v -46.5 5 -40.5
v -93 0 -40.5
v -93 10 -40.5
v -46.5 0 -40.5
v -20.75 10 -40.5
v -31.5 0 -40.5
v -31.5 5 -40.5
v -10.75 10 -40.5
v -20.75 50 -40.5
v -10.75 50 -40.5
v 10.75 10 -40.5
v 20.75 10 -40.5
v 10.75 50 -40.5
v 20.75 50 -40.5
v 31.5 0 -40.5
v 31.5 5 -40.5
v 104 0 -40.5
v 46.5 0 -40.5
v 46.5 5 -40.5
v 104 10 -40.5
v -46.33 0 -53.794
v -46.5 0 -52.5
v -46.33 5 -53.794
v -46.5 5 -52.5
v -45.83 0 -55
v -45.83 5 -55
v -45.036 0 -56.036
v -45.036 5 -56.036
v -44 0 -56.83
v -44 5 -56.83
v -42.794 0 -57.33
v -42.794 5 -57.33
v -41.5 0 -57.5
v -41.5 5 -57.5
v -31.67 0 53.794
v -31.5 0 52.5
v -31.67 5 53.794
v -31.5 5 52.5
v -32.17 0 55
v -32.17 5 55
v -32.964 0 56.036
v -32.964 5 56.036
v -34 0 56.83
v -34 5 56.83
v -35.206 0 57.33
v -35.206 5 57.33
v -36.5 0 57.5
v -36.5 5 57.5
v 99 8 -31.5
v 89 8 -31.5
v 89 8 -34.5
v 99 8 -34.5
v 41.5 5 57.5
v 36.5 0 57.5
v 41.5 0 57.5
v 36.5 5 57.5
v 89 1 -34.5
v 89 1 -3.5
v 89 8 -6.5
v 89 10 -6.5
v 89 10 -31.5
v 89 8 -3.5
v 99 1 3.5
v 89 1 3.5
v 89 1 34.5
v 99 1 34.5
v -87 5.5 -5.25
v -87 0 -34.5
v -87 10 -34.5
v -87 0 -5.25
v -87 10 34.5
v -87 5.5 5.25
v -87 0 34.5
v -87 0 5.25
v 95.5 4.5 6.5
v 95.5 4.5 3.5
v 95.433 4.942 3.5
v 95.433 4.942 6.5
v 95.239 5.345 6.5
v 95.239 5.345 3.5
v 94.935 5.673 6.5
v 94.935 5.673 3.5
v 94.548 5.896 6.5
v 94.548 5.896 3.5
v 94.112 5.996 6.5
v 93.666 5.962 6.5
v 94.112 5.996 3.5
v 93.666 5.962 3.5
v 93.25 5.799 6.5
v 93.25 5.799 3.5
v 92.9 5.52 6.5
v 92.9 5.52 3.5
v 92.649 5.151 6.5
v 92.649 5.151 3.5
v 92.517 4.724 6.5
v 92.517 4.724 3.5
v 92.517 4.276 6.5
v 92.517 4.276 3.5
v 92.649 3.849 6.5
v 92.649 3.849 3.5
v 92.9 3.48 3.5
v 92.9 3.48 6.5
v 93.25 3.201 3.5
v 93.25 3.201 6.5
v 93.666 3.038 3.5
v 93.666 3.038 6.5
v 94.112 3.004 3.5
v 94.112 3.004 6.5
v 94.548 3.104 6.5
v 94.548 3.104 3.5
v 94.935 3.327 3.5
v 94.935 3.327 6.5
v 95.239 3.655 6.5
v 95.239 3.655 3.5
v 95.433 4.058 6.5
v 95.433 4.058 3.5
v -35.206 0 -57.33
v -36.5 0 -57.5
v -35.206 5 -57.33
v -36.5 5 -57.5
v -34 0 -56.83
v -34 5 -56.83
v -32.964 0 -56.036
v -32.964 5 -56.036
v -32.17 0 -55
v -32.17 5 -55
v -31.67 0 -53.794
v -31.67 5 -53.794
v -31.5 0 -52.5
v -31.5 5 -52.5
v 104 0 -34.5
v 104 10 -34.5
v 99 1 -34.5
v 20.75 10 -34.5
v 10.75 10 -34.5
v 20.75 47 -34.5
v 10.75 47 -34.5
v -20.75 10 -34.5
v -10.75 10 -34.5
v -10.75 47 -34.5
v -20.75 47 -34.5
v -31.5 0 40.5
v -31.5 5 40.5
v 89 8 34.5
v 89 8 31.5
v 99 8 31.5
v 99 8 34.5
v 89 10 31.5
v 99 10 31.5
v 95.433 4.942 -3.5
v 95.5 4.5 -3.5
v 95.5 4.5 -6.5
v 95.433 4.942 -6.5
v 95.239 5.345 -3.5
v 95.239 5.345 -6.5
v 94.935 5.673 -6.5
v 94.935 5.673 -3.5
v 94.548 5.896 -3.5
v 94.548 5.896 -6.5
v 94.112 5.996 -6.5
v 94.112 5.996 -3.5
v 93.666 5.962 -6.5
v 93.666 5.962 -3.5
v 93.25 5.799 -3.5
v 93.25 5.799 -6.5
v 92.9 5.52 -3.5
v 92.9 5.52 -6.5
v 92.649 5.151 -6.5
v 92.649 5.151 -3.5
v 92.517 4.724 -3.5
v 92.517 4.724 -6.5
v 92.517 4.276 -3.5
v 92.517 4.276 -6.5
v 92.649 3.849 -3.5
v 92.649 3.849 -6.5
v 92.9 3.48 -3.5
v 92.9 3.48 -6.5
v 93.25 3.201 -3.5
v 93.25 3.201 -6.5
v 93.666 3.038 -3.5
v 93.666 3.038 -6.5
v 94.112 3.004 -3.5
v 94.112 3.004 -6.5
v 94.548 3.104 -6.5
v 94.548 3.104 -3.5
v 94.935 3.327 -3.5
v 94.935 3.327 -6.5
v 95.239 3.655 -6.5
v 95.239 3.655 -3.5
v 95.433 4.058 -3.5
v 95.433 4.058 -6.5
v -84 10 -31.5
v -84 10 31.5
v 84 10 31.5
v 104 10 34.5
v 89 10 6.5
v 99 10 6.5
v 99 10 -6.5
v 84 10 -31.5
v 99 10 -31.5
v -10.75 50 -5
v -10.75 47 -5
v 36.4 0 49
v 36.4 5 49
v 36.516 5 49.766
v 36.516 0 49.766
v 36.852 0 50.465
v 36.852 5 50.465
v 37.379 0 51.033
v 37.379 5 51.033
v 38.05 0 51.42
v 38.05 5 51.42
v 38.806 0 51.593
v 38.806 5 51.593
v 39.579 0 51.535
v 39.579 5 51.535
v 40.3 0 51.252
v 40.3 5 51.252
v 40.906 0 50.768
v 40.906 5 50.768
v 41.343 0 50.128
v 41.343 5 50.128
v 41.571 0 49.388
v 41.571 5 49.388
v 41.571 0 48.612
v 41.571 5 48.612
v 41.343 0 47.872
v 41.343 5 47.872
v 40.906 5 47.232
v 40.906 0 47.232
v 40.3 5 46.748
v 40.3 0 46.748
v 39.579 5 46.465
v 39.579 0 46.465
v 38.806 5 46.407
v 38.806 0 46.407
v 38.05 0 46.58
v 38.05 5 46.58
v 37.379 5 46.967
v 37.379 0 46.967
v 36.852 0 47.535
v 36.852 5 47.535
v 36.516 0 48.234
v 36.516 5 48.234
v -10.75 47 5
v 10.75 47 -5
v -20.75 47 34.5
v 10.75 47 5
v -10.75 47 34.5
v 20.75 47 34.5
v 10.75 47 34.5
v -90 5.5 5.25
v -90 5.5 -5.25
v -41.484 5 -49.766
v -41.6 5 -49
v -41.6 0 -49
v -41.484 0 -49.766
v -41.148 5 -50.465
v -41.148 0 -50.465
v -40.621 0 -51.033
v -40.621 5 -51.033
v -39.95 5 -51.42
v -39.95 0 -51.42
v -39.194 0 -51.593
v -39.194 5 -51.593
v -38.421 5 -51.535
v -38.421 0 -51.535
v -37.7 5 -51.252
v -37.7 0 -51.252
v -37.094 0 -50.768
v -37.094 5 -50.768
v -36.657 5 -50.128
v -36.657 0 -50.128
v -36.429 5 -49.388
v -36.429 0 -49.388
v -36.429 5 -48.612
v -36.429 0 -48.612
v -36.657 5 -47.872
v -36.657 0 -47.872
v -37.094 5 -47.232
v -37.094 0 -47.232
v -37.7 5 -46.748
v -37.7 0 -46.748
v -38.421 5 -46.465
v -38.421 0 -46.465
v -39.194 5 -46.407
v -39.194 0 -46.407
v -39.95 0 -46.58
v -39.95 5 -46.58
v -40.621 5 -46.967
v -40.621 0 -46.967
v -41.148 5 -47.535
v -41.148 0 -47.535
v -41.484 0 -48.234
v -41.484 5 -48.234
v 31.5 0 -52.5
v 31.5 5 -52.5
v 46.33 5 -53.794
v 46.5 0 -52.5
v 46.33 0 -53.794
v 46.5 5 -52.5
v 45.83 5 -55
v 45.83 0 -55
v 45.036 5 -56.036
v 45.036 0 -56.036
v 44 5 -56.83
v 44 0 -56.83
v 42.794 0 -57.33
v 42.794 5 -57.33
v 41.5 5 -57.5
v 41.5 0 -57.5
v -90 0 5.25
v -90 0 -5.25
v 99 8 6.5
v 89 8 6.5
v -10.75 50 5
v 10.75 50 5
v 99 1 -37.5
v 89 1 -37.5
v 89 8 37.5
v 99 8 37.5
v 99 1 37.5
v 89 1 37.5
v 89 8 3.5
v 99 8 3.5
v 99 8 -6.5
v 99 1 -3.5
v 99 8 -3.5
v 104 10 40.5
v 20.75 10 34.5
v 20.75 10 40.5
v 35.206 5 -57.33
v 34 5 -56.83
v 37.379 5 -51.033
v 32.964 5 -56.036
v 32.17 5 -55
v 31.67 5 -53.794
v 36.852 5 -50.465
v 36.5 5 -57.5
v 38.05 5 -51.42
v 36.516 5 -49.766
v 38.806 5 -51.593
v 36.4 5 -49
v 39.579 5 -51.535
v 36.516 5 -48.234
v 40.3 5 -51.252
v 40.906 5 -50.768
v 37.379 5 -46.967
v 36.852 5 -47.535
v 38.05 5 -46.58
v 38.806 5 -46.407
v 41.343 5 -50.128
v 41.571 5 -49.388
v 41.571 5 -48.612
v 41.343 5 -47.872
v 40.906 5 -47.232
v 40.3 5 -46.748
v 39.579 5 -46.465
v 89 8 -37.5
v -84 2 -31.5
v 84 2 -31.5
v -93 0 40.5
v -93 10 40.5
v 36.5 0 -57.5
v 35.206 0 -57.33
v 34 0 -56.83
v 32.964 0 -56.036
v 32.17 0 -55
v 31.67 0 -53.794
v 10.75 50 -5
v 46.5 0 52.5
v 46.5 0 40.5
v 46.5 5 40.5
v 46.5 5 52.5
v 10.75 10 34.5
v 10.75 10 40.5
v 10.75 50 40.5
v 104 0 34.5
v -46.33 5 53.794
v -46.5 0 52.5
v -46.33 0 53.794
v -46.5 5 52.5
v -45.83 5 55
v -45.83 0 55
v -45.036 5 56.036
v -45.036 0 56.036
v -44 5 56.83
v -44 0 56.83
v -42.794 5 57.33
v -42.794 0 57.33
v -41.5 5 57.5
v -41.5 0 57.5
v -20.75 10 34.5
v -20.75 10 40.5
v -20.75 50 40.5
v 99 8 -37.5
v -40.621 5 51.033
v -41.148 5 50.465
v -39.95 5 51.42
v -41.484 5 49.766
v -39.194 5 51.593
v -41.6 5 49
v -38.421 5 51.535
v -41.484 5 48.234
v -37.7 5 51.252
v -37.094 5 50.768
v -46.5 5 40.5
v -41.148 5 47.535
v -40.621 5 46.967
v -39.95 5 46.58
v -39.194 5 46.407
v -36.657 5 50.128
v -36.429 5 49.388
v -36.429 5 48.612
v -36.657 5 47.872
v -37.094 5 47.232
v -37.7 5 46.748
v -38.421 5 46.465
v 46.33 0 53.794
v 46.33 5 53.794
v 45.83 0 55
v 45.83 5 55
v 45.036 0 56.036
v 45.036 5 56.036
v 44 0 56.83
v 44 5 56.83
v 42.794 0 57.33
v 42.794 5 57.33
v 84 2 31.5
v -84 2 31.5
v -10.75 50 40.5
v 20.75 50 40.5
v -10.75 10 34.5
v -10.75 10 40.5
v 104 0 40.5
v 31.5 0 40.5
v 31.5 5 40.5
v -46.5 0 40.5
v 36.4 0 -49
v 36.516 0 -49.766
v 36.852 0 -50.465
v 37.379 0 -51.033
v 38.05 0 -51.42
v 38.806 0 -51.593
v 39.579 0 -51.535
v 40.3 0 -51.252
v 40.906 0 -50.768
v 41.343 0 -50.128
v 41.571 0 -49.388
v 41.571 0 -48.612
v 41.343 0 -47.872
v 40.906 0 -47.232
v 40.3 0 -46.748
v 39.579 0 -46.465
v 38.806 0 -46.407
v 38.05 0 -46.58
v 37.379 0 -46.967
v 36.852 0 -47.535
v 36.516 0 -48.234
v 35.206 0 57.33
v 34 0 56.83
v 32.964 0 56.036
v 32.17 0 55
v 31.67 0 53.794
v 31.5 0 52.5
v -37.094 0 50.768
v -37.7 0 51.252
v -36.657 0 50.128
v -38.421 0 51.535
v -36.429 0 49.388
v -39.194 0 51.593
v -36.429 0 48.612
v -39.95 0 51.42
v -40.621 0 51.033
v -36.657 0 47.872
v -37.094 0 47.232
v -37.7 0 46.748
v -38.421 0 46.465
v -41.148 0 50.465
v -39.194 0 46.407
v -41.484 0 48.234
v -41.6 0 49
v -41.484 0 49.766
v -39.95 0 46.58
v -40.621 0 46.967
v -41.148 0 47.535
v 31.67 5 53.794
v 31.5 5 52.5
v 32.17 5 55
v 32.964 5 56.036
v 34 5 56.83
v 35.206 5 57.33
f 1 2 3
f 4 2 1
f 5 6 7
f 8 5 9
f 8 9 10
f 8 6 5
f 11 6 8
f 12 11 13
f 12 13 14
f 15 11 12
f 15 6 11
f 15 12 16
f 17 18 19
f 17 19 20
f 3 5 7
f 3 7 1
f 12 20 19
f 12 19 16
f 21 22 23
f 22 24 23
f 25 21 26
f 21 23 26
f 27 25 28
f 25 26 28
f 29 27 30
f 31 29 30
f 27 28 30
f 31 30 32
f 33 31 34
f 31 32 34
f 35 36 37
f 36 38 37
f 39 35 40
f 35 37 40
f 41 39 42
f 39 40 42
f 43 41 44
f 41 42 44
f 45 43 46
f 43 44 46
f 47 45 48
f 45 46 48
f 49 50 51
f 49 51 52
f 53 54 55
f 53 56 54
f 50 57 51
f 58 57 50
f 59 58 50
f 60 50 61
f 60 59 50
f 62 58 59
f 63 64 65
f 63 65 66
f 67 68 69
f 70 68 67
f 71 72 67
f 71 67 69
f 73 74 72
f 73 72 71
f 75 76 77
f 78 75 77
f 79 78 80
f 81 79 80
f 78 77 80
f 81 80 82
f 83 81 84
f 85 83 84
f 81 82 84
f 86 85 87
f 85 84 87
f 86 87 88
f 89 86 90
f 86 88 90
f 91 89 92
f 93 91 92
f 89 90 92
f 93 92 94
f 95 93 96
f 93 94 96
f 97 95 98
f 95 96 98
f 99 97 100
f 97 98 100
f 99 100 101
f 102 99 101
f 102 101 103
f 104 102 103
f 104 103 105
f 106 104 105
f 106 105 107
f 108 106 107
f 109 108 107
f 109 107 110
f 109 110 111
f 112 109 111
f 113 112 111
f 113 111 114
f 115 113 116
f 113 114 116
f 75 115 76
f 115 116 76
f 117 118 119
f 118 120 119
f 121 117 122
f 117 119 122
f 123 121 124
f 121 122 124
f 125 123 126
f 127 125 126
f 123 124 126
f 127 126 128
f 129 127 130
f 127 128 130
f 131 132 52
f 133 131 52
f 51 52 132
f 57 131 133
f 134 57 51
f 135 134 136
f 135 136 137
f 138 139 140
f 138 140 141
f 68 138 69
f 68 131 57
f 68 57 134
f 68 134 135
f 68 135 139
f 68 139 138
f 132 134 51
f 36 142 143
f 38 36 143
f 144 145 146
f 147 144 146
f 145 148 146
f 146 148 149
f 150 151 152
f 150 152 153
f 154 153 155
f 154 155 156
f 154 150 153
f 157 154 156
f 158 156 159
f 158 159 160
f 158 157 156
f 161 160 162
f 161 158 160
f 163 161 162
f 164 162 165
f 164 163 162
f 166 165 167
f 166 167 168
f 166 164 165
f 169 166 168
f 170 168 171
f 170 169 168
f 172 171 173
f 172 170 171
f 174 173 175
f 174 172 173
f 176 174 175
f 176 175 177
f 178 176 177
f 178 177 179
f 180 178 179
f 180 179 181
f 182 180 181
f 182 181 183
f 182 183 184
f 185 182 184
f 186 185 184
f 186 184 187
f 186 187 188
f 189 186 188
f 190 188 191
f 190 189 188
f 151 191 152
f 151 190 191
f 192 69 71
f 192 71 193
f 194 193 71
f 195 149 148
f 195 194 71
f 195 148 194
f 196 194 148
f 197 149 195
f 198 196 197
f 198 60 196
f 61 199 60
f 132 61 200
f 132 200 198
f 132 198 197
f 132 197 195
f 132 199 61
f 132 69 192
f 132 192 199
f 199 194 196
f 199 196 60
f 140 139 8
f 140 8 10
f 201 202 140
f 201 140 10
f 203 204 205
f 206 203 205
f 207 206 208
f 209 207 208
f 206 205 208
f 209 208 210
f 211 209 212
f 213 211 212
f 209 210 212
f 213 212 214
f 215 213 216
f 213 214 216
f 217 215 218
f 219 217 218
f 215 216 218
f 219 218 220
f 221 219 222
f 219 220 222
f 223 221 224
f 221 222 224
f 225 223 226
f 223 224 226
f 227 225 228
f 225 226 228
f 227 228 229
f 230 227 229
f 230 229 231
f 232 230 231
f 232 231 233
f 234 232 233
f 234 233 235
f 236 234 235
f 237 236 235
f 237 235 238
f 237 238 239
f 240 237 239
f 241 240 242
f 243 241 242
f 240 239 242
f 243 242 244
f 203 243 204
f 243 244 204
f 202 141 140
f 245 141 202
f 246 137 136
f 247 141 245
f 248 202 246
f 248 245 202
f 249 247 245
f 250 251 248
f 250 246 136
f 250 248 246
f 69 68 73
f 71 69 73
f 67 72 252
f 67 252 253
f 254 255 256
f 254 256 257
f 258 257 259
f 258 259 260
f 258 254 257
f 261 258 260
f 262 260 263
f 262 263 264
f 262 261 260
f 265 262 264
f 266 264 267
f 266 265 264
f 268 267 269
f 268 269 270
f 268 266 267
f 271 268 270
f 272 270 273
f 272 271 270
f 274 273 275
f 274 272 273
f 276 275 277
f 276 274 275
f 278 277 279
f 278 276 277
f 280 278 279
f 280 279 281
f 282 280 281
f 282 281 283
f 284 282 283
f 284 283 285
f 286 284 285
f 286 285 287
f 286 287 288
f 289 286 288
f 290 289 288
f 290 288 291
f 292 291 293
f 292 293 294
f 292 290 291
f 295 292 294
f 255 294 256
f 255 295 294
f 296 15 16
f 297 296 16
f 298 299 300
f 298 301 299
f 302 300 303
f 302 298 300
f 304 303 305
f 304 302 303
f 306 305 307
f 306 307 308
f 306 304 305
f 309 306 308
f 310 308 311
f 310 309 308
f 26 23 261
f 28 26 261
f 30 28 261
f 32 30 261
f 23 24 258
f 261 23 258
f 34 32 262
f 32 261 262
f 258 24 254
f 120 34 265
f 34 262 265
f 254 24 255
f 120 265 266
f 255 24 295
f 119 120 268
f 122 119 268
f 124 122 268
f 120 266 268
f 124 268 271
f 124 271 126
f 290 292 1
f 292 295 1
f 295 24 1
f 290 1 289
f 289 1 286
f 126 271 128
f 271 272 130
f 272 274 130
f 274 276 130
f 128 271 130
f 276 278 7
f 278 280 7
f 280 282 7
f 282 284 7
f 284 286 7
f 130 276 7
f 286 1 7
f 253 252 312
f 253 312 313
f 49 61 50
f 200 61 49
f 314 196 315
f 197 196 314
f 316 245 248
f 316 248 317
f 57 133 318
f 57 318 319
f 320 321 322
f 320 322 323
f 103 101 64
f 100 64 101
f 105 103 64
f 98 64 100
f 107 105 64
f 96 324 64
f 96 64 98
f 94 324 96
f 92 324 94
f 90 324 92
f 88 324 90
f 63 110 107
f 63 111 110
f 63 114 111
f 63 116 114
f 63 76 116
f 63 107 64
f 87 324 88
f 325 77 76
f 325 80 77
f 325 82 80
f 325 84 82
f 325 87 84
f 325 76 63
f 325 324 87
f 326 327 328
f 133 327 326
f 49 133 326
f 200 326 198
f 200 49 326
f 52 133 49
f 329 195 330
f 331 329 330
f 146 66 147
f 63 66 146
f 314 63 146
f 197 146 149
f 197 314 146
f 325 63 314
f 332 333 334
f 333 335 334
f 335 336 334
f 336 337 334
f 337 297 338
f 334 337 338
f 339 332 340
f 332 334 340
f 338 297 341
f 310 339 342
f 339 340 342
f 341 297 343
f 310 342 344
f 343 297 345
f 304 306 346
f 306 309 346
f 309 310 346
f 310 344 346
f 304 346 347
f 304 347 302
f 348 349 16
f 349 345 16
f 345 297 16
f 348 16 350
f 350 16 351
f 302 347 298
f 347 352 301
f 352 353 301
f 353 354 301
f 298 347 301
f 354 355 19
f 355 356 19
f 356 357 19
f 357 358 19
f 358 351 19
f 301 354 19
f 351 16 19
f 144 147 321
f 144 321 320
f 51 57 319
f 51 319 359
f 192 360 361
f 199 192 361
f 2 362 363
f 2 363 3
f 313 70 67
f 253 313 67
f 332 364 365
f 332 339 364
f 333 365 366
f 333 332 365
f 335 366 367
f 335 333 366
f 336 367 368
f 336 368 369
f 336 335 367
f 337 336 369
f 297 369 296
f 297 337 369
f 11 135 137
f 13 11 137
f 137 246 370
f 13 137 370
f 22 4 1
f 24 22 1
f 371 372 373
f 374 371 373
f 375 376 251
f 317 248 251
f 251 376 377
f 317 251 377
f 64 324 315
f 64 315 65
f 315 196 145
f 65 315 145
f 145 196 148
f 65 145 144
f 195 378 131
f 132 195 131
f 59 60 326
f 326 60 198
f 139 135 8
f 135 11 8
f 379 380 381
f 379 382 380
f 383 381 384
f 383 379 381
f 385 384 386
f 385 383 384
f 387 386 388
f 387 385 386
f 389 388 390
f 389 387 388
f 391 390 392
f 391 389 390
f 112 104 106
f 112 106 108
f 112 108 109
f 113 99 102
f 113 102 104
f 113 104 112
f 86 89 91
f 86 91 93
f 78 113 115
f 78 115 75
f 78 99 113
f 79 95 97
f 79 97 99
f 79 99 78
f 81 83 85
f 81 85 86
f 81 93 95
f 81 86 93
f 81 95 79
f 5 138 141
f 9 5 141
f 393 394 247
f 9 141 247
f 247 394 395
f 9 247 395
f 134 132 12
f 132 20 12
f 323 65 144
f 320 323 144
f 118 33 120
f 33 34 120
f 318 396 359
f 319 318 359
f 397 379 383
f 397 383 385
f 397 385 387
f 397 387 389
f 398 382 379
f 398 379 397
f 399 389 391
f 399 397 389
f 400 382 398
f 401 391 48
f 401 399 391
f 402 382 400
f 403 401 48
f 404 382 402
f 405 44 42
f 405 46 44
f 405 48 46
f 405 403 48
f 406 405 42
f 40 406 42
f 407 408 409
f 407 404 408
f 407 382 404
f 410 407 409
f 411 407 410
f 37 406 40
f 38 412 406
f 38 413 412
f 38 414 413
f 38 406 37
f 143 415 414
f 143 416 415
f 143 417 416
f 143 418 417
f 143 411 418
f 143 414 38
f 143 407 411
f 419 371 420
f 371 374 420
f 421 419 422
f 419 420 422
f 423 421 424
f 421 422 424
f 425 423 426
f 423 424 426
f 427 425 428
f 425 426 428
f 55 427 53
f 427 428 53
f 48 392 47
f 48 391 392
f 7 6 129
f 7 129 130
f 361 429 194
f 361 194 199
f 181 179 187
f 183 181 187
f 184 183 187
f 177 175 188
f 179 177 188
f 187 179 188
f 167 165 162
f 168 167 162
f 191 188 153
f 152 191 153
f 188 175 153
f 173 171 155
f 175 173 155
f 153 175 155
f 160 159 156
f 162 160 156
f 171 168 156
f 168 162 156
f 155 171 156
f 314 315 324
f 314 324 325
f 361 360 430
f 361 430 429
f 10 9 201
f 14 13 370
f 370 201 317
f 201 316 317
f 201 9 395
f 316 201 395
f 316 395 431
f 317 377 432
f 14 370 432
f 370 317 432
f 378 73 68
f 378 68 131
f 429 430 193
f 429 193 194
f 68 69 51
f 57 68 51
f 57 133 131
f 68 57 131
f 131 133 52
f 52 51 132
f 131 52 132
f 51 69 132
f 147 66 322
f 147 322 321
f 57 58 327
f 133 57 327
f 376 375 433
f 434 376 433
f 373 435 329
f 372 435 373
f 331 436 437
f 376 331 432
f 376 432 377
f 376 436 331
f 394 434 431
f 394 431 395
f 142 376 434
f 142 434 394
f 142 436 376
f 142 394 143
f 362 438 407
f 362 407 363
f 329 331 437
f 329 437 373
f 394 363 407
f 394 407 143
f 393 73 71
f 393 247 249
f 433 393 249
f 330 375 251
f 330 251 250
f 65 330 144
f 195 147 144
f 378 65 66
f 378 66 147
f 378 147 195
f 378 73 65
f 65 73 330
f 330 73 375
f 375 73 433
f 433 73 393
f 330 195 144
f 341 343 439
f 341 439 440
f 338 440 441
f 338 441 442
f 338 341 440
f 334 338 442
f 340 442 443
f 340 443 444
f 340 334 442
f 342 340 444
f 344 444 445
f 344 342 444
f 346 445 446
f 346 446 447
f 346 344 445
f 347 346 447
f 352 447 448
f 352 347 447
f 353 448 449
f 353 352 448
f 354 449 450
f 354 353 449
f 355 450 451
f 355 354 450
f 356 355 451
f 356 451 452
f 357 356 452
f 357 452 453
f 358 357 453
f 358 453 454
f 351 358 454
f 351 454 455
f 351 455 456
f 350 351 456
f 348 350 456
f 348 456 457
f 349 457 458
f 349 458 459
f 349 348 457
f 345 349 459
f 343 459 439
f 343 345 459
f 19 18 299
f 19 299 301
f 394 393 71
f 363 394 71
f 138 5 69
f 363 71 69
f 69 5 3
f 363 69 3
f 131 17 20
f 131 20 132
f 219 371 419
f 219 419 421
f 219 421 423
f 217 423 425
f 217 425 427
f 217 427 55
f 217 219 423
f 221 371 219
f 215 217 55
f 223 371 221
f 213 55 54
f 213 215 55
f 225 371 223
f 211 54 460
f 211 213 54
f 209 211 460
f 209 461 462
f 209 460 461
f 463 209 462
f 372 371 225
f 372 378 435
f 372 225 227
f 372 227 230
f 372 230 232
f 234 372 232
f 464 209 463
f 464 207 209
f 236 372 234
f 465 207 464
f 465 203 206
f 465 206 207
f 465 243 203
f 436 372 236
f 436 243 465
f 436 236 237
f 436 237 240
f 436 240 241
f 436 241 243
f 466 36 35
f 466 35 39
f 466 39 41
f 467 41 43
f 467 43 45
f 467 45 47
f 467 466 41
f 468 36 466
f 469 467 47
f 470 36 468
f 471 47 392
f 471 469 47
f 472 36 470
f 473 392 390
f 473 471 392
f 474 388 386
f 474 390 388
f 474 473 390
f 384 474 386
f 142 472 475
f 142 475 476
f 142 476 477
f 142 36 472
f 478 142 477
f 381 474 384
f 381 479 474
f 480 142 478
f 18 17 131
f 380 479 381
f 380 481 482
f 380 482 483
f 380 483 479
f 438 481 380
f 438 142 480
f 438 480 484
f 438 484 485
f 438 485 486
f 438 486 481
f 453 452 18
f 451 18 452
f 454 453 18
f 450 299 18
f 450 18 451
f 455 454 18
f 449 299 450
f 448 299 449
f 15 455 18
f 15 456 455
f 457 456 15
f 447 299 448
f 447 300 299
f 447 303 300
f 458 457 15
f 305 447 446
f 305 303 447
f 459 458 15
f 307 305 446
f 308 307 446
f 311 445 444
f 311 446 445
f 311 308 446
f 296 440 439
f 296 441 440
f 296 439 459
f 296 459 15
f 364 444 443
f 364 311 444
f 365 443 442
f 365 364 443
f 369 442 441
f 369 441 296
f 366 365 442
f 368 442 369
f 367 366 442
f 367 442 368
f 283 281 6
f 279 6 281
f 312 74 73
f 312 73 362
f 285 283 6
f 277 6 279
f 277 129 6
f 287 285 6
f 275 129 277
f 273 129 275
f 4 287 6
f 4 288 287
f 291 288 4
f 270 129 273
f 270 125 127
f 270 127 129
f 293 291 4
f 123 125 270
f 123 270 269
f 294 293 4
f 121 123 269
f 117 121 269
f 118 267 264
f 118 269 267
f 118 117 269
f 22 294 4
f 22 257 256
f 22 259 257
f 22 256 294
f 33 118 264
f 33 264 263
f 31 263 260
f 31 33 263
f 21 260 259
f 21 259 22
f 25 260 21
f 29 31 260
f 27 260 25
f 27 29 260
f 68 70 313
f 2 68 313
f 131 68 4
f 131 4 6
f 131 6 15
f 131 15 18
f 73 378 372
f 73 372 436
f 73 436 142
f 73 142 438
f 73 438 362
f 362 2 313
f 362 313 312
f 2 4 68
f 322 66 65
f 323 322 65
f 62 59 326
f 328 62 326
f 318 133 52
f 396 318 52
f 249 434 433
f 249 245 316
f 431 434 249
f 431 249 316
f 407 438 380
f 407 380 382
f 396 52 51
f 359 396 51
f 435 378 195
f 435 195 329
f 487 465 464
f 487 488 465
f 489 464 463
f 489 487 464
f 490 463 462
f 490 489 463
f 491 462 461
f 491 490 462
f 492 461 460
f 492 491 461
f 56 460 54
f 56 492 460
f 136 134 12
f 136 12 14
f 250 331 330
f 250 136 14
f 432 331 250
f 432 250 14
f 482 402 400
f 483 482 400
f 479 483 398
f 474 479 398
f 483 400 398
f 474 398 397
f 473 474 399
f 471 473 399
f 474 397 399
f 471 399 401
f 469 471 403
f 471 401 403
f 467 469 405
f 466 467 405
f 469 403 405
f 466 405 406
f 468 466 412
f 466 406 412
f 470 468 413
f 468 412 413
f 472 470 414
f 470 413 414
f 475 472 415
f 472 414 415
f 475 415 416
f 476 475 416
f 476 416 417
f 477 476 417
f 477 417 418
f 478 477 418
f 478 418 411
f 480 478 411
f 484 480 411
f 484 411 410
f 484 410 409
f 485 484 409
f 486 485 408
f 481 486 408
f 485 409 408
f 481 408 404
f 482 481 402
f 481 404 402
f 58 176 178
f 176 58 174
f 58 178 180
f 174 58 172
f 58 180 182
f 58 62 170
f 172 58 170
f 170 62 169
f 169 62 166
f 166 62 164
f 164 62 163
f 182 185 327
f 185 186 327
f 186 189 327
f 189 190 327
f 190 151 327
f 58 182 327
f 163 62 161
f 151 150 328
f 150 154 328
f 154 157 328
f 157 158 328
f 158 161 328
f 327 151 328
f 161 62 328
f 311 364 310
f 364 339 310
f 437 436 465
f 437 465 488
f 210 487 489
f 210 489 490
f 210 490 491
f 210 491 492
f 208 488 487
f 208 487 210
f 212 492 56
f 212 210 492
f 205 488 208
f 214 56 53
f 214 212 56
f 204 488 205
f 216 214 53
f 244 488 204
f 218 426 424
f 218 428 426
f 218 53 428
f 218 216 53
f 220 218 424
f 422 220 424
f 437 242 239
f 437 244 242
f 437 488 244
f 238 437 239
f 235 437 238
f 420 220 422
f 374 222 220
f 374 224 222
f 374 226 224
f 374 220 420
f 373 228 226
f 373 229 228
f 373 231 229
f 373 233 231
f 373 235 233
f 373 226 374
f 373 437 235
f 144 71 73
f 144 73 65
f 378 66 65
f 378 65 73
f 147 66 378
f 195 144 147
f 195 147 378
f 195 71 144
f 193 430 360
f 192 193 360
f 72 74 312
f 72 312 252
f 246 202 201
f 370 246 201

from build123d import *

# Parameters (mm, degrees)
SKETCH1_W                      = 168
SKETCH1_H                      = 63
BOSS_EXTRUDE1_DEPTH            = 10
SKETCH2_W                      = 168
SKETCH2_H                      = 63
BOSS_EXTRUDE2_DEPTH            = 2
SKETCH3_W                      = 10
SKETCH3_H                      = 25
CUT_EXTRUDE1_DEPTH             = 111.028405423
SKETCH4_W                      = 10
SKETCH4_H                      = 8
CUT_EXTRUDE2_DEPTH             = 3
CUT_EXTRUDE2_DIRECTION_2_REACH = 114.236
SKETCH6_W                      = 10
SKETCH6_H                      = 1
BOSS_EXTRUDE4_DEPTH            = 31
SKETCH7_R                      = 1.5
BOSS_EXTRUDE5_DEPTH            = 3
BOSS_EXTRUDE6_DEPTH            = 10
SKETCH16_W                     = 10.5
SKETCH16_H                     = 5.5
CUT_EXTRUDE5_DEPTH             = 3
SKETCH15_W                     = 10
SKETCH15_H                     = 7
CUT_EXTRUDE6_DEPTH             = 3
SKETCH17_W                     = 15
SKETCH17_H                     = 5
BOSS_EXTRUDE7_DEPTH            = 17
SKETCH18_R                     = 2.6
CUT_EXTRUDE7_DEPTH             = 5
FILLET1_R                      = 5
FILLET1_OF_MIRROR8_R           = 5
SKETCH19_W                     = 10
SKETCH19_H                     = 6
BOSS_EXTRUDE8_DEPTH            = 40
BOSS_EXTRUDE9_REACH            = 149.58
SKETCH20_W                     = 10
SKETCH20_H                     = 3
BOSS_EXTRUDE10_REACH           = 139.745
SKETCH21_W                     = 10
SKETCH21_H                     = 3


with BuildPart() as part:
    # Sketch1 → Boss-Extrude1 (new body)
    with BuildSketch(Plane(origin=(0, 0, 0), x_dir=(1, 0, 0), z_dir=(0, 1, 0))):
        Polygon((0, 34.5), (-87, 34.5), (-87, -34.5), (84, -34.5), (104, -34.5), (104, 34.5), (84, 34.5), align=None)
        Rectangle(SKETCH1_W, SKETCH1_H, mode=Mode.SUBTRACT)
    extrude(amount=BOSS_EXTRUDE1_DEPTH)

    # Sketch2 → Boss-Extrude2 (add)
    with BuildSketch(Plane(origin=(0, 0, 0), x_dir=(1, 0, 0), z_dir=(0, 1, 0))):
        Rectangle(SKETCH2_W, SKETCH2_H)
    extrude(amount=BOSS_EXTRUDE2_DEPTH)

    # Sketch3 → Cut-Extrude1 (cut, through all)
    with BuildSketch(Plane(origin=(0, 10, 0), x_dir=(1, 0, 0), z_dir=(0, 1, 0))):
        with Locations((94, 19)):
            Rectangle(SKETCH3_W, SKETCH3_H)
    cut_extrude1 = extrude(amount=-CUT_EXTRUDE1_DEPTH, mode=Mode.SUBTRACT)

    # Mirror1: Cut-Extrude1 across plane
    add(cut_extrude1.mirror(Plane.XY), mode=Mode.SUBTRACT)

    # Sketch4 → Cut-Extrude2 (cut)
    with BuildSketch(Plane.XY.offset(6.5)):
        with Locations((94, 4)):
            Rectangle(SKETCH4_W, SKETCH4_H)
    cut_extrude2 = extrude(amount=-CUT_EXTRUDE2_DEPTH, mode=Mode.SUBTRACT)

    # Sketch4 → Cut-Extrude2 direction 2 (cut, up to next)
    with BuildSketch(Plane.XY.offset(6.5), mode=Mode.PRIVATE) as cut_extrude2_direction_2_sk1:
        with Locations((94, 4)):
            Rectangle(SKETCH4_W, SKETCH4_H)
    cut_extrude2_direction_2_tool1 = extrude(cut_extrude2_direction_2_sk1.sketch, amount=CUT_EXTRUDE2_DIRECTION_2_REACH, mode=Mode.PRIVATE) & part.part
    cut_extrude2_direction_2 = cut_extrude2_direction_2_tool1.solids().sort_by_distance((94, 4, 6.5))[0]
    add(cut_extrude2_direction_2, mode=Mode.SUBTRACT)

    # Mirror2: Cut-Extrude2, Cut-Extrude2 direction 2 across plane
    add(cut_extrude2.mirror(Plane.XY), mode=Mode.SUBTRACT)
    add(cut_extrude2_direction_2.mirror(Plane.XY), mode=Mode.SUBTRACT)

    # Sketch6 → Boss-Extrude4 (add)
    with BuildSketch(Plane.XY.offset(3.5)):
        with Locations((94, 0.5)):
            Rectangle(SKETCH6_W, SKETCH6_H)
    boss_extrude4 = extrude(amount=BOSS_EXTRUDE4_DEPTH)

    # Mirror5: Boss-Extrude4 across plane
    add(boss_extrude4.mirror(Plane.XY))

    # Sketch7 → Boss-Extrude5 (add)
    with BuildSketch(Plane.XY.offset(3.5)):
        with Locations((94, 4.5)):
            Circle(SKETCH7_R)
    boss_extrude5 = extrude(amount=BOSS_EXTRUDE5_DEPTH)

    # Mirror6: Boss-Extrude5 across plane
    add(boss_extrude5.mirror(Plane.XY))


with BuildPart() as body_2:
    # Sketch8 → Boss-Extrude6 (new body)
    with BuildSketch(Plane(origin=(0, 0, 0), x_dir=(1, 0, 0), z_dir=(0, 1, 0))):
        Polygon((104, -34.5), (104, -40.5), (-93, -40.5), (-93, 40.5), (104, 40.5), (104, 34.5), (-87, 34.5), (-87, -34.5), align=None)
    extrude(amount=BOSS_EXTRUDE6_DEPTH)

    # Sketch16 → Cut-Extrude5 (cut)
    with BuildSketch(Plane(origin=(-87, 0, 0), x_dir=(0, 0, -1), z_dir=(1, 0, 0))):
        with Locations((0, 2.75)):
            Rectangle(SKETCH16_W, SKETCH16_H)
    extrude(amount=-CUT_EXTRUDE5_DEPTH, mode=Mode.SUBTRACT)

    # Sketch15 → Cut-Extrude6 (cut)
    with BuildSketch(Plane(origin=(0, 0, 34.5), x_dir=(-1, 0, 0), z_dir=(0, 0, -1))):
        with Locations((-94, 4.5)):
            Rectangle(SKETCH15_W, SKETCH15_H)
    cut_extrude6 = extrude(amount=-CUT_EXTRUDE6_DEPTH, mode=Mode.SUBTRACT)

    # Mirror7: Cut-Extrude6 across plane
    add(cut_extrude6.mirror(Plane.XY), mode=Mode.SUBTRACT)

    # Sketch17 → Boss-Extrude7 (add)
    with BuildSketch(Plane.XY.offset(40.5)):
        with Locations((-39, 2.5)):
            Rectangle(SKETCH17_W, SKETCH17_H)
        with Locations((39, 2.5)):
            Rectangle(SKETCH17_W, SKETCH17_H)
    boss_extrude7 = extrude(amount=BOSS_EXTRUDE7_DEPTH)

    # Sketch18 → Cut-Extrude7 (cut)
    with BuildSketch(Plane(origin=(0, 5, 0), x_dir=(1, 0, 0), z_dir=(0, 1, 0))):
        with Locations(Location((-39, -49, 0), (0, 0, 180))):
            Circle(SKETCH18_R)
        with Locations(Location((39, -49, 0), (0, 0, 180))):
            Circle(SKETCH18_R)
    cut_extrude7 = extrude(amount=-CUT_EXTRUDE7_DEPTH, mode=Mode.SUBTRACT)

    # Fillet1
    fillet1_edges = [body_2.edges().sort_by_distance(p)[0] for p in [
        (-46.5, 2.5, 57.5),
        (-31.5, 2.5, 57.5),
        (31.5, 2.5, 57.5),
        (46.5, 2.5, 57.5),
    ]]
    fillet(fillet1_edges, radius=FILLET1_R)

    # Mirror8: Boss-Extrude7, Cut-Extrude7 across plane
    add(boss_extrude7.mirror(Plane.XY))
    add(cut_extrude7.mirror(Plane.XY), mode=Mode.SUBTRACT)

    # Fillet1 of Mirror8
    fillet1_of_mirror8_edges = [body_2.edges().sort_by_distance(p)[0] for p in [
        (-46.5, 2.5, -57.5),
        (-31.5, 2.5, -57.5),
        (31.5, 2.5, -57.5),
        (46.5, 2.5, -57.5),
    ]]
    fillet(fillet1_of_mirror8_edges, radius=FILLET1_OF_MIRROR8_R)

    # Sketch19 → Boss-Extrude8 (add)
    with BuildSketch(Plane(origin=(0, 10, 0), x_dir=(1, 0, 0), z_dir=(0, 1, 0))):
        with Locations((-15.75, -37.5)):
            Rectangle(SKETCH19_W, SKETCH19_H)
        with Locations((15.75, -37.5)):
            Rectangle(SKETCH19_W, SKETCH19_H)
    boss_extrude8 = extrude(amount=BOSS_EXTRUDE8_DEPTH)

    # Mirror9: Boss-Extrude8 across plane
    add(boss_extrude8.mirror(Plane.XY))

    # Sketch20 → Boss-Extrude9 (add, up to next)
    with BuildSketch(Plane(origin=(0, 0, 34.5), x_dir=(-1, 0, 0), z_dir=(0, 0, -1)), mode=Mode.PRIVATE) as boss_extrude9_sk1:
        with Locations((-15.75, 48.5)):
            Rectangle(SKETCH20_W, SKETCH20_H)
    boss_extrude9_tool1 = extrude(boss_extrude9_sk1.sketch, amount=BOSS_EXTRUDE9_REACH, mode=Mode.PRIVATE) - body_2.part
    boss_extrude9 = boss_extrude9_tool1.solids().sort_by_distance((15.75, 48.5, 34.5))[0]
    add(boss_extrude9)

    # Mirror10: Boss-Extrude9 across plane
    add(boss_extrude9.mirror(Plane(origin=(0, 0, 0), x_dir=(0, 0, 1), z_dir=(1, 0, 0))))

    # Sketch21 → Boss-Extrude10 (add, up to next)
    with BuildSketch(Plane(origin=(-10.75, 0, 0), x_dir=(0, 0, -1), z_dir=(1, 0, 0)), mode=Mode.PRIVATE) as boss_extrude10_sk1:
        with Locations((0, 48.5)):
            Rectangle(SKETCH21_W, SKETCH21_H)
    boss_extrude10_tool1 = extrude(boss_extrude10_sk1.sketch, amount=BOSS_EXTRUDE10_REACH, mode=Mode.PRIVATE) - body_2.part
    add(boss_extrude10_tool1.solids().sort_by_distance((-10.75, 48.5, 0))[0])


solid = Compound([part.part, body_2.part])
